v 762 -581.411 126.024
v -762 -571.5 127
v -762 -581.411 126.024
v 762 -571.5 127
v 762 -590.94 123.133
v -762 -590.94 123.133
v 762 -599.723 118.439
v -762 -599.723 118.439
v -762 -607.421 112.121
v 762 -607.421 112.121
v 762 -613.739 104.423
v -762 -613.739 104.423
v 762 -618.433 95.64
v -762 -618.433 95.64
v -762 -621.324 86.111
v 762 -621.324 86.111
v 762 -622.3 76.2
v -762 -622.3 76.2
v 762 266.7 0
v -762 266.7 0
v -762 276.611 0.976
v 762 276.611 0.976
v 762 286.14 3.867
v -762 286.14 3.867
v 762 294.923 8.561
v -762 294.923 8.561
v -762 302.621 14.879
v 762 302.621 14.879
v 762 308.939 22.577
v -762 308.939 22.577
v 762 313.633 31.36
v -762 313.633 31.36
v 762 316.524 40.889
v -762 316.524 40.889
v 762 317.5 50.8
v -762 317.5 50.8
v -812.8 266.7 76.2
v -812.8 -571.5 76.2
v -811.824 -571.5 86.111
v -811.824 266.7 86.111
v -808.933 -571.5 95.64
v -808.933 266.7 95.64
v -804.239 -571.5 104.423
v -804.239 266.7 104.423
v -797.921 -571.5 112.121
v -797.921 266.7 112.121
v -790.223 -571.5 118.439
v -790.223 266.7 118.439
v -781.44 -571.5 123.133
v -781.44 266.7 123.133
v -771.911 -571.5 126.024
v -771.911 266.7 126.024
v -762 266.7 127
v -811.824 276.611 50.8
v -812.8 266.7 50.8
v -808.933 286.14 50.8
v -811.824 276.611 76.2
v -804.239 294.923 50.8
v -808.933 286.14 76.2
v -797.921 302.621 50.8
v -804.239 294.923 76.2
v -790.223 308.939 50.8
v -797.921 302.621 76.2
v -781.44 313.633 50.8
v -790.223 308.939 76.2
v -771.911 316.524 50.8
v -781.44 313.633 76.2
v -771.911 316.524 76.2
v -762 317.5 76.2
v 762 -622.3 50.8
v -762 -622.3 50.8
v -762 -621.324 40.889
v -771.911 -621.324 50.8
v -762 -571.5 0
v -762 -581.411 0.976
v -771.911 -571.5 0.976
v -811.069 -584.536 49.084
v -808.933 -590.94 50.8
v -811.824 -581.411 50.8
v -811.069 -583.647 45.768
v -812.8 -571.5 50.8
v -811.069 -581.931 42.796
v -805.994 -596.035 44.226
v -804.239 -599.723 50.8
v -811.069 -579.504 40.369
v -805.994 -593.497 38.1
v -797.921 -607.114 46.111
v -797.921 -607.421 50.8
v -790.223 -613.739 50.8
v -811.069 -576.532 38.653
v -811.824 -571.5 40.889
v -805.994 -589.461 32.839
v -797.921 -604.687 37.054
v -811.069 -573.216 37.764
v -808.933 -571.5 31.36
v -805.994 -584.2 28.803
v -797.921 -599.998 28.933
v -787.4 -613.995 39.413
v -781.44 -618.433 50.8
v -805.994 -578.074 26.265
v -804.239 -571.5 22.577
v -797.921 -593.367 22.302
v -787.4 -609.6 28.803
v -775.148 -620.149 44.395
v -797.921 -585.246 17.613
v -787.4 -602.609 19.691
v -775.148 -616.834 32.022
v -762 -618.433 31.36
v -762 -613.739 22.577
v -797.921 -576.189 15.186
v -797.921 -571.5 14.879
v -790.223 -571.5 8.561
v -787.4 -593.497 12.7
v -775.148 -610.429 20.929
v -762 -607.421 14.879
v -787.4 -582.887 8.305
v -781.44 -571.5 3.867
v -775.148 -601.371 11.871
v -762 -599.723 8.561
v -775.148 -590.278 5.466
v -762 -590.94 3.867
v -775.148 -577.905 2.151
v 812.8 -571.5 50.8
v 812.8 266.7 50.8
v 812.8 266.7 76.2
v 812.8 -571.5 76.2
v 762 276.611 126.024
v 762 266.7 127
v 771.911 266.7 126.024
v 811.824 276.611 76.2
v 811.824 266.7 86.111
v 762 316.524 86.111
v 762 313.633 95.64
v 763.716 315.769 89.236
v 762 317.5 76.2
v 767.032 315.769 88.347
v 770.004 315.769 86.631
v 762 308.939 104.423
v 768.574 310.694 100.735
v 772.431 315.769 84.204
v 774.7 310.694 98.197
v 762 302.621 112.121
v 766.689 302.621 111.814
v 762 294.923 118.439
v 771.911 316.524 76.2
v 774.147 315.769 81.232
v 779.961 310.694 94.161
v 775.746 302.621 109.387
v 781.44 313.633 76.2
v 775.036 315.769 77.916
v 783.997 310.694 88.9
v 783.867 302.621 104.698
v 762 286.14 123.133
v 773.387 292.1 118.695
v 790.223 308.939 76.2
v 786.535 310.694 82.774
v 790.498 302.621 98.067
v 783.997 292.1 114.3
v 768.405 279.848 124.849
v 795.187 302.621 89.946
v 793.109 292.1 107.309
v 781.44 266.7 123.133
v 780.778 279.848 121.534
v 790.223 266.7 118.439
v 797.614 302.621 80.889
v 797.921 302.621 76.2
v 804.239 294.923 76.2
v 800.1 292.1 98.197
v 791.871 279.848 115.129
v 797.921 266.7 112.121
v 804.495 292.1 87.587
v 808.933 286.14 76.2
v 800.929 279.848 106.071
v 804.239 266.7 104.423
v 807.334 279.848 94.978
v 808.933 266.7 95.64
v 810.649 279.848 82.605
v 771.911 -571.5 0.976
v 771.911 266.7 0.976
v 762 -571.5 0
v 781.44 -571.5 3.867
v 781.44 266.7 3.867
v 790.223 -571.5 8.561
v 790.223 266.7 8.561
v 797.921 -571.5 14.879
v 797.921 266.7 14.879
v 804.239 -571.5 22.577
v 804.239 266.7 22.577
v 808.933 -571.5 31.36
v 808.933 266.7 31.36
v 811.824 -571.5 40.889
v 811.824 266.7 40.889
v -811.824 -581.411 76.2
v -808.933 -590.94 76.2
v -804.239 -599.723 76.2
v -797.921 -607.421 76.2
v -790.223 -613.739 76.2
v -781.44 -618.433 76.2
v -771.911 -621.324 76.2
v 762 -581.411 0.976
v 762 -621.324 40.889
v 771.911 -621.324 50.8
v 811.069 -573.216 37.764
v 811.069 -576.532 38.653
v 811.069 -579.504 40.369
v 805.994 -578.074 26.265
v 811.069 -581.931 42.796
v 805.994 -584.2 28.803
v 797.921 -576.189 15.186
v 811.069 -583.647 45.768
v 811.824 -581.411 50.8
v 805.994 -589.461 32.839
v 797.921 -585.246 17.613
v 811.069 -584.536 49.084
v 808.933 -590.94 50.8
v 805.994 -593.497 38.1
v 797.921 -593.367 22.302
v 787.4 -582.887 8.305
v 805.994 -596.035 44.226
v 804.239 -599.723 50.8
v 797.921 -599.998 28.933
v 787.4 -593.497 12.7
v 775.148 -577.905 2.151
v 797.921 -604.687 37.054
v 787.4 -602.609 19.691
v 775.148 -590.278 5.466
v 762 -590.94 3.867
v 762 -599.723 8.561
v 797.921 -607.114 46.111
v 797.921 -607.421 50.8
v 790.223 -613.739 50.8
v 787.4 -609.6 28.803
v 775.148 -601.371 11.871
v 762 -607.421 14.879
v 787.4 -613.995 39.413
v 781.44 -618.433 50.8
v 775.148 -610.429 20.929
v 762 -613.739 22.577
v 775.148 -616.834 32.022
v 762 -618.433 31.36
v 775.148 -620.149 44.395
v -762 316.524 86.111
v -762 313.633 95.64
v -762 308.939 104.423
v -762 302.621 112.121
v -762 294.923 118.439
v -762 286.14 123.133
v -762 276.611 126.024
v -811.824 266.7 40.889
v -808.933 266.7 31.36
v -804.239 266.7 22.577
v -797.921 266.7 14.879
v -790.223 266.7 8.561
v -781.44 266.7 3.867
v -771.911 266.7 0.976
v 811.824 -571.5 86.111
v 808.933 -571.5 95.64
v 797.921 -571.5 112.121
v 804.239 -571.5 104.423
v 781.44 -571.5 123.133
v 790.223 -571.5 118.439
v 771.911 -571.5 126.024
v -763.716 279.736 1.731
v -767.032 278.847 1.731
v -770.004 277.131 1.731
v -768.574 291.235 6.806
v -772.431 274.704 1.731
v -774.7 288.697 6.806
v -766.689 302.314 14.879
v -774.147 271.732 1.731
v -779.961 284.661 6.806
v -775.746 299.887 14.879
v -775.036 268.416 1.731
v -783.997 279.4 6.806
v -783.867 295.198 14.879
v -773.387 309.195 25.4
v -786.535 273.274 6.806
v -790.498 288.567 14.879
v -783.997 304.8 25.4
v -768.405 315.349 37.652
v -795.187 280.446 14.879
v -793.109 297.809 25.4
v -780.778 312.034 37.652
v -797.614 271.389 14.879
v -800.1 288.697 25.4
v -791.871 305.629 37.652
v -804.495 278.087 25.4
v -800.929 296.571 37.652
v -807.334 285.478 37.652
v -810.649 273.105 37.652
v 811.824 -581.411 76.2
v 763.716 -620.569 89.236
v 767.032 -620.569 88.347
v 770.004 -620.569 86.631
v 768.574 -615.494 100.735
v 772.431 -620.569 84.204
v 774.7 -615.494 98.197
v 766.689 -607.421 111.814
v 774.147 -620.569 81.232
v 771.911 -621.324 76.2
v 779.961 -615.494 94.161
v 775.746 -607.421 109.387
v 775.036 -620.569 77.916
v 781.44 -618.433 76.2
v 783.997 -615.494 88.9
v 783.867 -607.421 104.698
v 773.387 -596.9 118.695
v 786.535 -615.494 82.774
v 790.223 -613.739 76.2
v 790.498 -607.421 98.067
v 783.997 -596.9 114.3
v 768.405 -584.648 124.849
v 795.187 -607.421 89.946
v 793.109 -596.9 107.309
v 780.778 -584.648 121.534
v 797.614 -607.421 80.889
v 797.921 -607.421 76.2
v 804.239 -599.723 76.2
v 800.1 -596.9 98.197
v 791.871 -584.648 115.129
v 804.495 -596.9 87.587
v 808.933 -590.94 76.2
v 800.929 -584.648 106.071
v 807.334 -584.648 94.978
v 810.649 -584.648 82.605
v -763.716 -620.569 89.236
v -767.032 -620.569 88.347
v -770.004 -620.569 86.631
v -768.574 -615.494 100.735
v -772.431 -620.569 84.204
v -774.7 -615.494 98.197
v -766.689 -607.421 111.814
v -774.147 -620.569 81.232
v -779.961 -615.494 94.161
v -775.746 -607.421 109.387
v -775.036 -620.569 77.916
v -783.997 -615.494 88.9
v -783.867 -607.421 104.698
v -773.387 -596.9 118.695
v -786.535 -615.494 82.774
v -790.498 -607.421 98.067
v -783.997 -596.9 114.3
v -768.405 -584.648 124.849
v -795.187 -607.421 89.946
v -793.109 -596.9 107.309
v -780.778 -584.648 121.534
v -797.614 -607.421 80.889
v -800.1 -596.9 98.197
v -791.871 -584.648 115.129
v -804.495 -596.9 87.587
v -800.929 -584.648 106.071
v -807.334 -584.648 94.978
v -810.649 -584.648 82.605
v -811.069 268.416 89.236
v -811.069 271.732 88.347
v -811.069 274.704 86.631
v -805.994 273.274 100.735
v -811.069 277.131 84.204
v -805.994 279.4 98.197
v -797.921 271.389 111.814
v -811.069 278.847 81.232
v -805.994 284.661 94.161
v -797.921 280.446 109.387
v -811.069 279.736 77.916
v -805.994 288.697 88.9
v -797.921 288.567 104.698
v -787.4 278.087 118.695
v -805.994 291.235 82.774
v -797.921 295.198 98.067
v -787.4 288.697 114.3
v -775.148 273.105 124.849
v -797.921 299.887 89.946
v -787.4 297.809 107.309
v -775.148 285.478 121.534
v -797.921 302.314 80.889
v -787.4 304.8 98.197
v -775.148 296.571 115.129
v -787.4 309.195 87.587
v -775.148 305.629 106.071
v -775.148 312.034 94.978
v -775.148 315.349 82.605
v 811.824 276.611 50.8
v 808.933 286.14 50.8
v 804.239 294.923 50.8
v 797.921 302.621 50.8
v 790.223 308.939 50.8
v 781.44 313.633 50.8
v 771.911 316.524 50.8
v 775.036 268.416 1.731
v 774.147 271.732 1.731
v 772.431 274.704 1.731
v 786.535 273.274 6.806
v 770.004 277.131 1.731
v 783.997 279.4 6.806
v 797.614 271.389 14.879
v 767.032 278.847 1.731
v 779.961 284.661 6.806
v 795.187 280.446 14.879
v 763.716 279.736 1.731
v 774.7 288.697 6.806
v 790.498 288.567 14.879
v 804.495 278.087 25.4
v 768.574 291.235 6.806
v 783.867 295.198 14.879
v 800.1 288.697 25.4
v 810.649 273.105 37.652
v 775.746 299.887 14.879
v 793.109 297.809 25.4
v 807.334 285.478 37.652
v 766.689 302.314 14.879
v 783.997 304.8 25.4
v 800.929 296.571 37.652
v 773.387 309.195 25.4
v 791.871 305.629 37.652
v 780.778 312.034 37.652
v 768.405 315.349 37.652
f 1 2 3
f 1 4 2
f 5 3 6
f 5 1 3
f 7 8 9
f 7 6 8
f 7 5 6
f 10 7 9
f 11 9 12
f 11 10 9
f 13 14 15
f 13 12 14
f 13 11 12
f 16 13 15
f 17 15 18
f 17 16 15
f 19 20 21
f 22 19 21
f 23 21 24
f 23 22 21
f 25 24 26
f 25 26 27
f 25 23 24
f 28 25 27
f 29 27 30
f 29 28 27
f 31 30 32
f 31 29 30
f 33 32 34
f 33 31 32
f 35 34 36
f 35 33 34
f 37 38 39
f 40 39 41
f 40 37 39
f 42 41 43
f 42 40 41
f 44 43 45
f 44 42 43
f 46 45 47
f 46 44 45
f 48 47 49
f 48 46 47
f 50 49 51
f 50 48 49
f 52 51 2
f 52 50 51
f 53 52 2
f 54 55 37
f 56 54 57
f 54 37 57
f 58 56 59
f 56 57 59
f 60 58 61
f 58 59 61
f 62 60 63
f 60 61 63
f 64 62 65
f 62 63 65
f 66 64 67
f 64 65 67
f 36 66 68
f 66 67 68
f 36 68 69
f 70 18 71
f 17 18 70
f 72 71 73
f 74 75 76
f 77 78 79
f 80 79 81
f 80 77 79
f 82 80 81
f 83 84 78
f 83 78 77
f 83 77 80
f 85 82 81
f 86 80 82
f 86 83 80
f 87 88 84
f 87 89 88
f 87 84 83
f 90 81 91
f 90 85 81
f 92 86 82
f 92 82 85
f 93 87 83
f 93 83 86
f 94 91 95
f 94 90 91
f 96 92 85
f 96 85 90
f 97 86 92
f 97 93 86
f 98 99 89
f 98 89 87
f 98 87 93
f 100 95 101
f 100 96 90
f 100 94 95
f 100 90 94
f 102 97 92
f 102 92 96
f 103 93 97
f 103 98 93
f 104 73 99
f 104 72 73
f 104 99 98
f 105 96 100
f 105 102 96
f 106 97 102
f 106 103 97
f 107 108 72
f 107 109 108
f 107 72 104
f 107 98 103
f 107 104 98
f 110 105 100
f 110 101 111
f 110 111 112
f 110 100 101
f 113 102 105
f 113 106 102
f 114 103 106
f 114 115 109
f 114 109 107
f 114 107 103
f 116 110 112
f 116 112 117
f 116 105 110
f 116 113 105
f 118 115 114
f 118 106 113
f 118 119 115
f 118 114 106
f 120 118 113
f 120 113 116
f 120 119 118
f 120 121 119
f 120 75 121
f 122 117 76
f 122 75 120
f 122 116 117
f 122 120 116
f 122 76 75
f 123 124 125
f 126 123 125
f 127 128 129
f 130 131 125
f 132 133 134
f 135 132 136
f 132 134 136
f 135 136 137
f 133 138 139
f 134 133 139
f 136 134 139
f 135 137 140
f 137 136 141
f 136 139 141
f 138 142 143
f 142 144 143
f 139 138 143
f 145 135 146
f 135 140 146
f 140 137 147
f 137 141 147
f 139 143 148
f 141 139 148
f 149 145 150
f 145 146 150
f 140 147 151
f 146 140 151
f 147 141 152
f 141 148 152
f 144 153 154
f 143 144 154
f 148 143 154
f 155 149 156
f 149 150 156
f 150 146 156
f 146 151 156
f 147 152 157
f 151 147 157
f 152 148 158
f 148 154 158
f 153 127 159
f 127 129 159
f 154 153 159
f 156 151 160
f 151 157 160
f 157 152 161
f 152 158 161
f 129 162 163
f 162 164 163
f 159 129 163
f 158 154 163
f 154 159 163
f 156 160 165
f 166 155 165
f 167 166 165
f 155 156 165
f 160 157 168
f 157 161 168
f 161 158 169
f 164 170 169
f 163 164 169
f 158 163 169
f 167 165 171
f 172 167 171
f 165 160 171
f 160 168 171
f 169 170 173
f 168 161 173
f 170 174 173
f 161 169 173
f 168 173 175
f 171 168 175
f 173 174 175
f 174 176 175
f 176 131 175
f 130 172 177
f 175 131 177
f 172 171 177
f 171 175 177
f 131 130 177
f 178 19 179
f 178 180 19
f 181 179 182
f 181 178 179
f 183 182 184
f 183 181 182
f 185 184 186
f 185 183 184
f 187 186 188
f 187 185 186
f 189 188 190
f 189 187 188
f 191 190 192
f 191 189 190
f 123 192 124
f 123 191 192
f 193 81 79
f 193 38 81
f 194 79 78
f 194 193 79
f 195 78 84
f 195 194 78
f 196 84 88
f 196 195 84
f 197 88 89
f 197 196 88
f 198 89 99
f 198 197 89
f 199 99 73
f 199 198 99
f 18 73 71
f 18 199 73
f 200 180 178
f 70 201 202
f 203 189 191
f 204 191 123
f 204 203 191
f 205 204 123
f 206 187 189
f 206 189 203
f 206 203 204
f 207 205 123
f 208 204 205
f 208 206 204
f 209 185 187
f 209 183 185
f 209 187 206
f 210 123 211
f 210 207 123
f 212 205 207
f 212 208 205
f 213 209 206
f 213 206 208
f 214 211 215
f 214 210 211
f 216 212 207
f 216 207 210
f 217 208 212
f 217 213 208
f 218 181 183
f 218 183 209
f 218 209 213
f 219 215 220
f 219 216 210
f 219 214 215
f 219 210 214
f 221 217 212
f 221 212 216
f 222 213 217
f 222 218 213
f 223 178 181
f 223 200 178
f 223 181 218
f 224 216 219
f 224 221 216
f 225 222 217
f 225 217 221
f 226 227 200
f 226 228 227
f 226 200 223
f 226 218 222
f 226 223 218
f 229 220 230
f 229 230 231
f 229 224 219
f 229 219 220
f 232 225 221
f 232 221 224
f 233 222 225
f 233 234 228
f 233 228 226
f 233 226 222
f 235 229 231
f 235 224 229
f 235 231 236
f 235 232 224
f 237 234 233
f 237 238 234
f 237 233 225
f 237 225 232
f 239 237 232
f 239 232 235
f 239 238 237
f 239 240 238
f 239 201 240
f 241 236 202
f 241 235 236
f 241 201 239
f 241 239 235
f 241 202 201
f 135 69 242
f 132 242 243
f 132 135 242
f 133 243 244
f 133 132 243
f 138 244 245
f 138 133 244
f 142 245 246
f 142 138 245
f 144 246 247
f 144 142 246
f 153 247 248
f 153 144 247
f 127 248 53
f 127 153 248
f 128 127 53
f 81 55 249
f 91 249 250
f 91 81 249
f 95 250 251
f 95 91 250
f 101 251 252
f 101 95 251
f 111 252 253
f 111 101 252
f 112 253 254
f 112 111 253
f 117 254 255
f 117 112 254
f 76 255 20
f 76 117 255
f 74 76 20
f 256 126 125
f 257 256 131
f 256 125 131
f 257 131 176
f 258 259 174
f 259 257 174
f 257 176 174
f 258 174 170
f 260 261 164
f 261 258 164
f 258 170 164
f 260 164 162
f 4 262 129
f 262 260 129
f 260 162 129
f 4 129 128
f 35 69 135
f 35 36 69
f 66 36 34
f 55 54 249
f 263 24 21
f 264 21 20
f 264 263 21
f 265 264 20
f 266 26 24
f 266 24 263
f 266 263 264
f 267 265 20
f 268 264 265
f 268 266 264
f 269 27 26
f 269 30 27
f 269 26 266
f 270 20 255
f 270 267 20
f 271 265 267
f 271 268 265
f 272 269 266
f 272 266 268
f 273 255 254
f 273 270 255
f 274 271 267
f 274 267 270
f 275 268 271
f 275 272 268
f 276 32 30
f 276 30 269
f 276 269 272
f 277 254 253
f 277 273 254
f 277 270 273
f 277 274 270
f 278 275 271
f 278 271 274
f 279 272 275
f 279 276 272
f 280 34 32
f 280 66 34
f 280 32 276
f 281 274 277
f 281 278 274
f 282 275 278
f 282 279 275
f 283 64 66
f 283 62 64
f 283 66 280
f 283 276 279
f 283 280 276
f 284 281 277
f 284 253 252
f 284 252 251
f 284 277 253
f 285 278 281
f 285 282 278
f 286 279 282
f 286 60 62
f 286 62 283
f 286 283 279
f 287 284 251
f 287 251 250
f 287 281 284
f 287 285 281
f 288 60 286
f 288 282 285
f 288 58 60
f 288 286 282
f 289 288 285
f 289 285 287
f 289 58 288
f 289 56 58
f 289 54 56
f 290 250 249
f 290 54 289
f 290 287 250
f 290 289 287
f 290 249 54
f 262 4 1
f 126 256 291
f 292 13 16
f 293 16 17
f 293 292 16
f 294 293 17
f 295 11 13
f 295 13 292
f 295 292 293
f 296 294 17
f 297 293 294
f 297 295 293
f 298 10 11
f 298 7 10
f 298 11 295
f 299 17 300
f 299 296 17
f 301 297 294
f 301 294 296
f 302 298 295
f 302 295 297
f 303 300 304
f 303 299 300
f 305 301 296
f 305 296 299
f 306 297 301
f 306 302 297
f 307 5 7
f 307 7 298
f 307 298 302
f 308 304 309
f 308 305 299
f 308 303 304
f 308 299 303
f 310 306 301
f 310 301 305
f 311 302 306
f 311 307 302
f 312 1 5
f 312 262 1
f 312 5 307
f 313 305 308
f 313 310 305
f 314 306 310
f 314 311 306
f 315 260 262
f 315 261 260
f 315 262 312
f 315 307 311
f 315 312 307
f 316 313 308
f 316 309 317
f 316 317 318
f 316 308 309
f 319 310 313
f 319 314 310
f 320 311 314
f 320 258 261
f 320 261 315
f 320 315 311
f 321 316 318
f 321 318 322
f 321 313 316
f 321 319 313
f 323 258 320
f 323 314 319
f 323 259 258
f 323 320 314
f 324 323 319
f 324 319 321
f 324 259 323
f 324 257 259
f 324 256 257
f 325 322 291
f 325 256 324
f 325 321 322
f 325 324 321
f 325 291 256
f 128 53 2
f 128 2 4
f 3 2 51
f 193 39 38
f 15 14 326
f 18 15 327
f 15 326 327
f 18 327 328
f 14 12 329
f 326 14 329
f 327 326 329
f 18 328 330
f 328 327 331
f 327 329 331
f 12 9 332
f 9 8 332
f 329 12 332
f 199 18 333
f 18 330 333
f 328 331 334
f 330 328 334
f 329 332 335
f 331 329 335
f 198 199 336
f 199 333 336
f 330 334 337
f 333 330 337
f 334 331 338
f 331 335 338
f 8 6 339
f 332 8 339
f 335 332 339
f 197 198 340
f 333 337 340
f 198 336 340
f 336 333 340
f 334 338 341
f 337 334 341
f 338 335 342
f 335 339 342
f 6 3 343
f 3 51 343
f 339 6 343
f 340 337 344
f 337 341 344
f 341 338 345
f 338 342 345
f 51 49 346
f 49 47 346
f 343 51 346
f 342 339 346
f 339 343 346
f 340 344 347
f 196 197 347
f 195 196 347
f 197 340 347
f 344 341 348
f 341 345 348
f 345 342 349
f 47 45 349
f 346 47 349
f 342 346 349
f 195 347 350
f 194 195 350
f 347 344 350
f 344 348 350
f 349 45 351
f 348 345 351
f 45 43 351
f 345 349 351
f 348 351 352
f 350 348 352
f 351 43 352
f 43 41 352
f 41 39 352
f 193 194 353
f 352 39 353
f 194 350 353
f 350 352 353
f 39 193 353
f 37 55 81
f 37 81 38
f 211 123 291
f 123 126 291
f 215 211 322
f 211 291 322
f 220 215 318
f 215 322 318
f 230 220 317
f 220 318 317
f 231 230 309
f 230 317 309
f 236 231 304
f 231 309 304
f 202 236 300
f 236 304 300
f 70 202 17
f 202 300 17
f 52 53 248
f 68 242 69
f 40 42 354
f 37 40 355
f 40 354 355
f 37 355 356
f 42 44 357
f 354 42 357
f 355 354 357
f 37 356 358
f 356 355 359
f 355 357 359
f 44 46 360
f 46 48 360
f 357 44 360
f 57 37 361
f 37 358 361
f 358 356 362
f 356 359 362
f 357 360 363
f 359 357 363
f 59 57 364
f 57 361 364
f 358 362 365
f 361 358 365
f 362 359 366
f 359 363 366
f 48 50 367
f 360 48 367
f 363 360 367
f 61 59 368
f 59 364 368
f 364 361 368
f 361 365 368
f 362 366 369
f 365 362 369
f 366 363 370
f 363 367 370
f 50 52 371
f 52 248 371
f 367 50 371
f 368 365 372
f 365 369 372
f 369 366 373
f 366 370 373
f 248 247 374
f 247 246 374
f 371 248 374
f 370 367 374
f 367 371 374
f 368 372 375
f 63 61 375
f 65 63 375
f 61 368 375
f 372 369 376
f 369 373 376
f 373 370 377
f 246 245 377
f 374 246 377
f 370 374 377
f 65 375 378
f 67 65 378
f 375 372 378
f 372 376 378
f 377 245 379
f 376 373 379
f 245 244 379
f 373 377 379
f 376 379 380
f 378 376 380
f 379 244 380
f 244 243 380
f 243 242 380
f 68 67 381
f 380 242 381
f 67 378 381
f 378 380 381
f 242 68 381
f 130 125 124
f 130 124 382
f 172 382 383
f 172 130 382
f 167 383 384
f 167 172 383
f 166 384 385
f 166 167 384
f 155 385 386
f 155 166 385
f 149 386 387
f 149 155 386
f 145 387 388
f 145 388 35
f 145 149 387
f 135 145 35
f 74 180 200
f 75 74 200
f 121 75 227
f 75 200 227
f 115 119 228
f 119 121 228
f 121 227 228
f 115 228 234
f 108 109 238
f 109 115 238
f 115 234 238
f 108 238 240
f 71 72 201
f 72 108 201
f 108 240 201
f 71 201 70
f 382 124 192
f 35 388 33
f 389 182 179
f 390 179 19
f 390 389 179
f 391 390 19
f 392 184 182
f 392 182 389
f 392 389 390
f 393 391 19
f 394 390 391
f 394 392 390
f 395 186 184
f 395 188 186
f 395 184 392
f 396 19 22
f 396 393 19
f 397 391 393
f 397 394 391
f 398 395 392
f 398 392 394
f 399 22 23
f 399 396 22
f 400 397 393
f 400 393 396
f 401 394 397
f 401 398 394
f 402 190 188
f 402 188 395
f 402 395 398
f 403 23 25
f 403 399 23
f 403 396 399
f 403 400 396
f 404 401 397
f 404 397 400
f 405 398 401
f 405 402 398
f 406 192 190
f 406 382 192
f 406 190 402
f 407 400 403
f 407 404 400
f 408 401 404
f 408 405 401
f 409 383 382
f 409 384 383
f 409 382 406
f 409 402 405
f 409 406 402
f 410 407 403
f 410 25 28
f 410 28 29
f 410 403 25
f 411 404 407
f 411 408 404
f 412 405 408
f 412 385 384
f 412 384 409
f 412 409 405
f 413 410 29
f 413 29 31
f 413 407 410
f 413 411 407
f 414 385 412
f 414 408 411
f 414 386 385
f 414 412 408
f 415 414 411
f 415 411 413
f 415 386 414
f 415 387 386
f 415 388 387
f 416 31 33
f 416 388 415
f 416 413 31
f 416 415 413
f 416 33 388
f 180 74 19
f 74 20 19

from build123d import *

# Parameters (mm, degrees)
F0_W      = 1625.6
F0_H      = 635
F1_DEPTH  = 127
F1_FACE_W = 1625.6
F1_FACE_H = 127
F2_DEPTH  = 304.8
F3_R      = 50.8


with BuildPart() as f1:
    # F0 (on Top) → F1 (new body)
    with BuildSketch(Plane.XY):
        Rectangle(F0_W, F0_H)
    extrude(amount=F1_DEPTH)

    # F1_face (on face) → F2 (join)
    with BuildSketch(Plane(origin=(0, -317.5, 63.5), x_dir=(1, 0, 0), z_dir=(0, -1, 0))):
        Rectangle(F1_FACE_W, F1_FACE_H)
    extrude(amount=F2_DEPTH)

    # F3
    f3_edges = [f1.edges().sort_by_distance(p)[0] for p in [
        (812.8, -152.4, 127),
        (0, 317.5, 127),
        (-812.8, -152.4, 127),
        (0, -622.3, 127),
        (0, -622.3, 0),
        (812.8, 317.5, 63.5),
        (812.8, -152.4, 0),
        (812.8, -622.3, 63.5),
        (-812.8, 317.5, 63.5),
        (0, 317.5, 0),
        (-812.8, -622.3, 63.5),
        (-812.8, -152.4, 0),
    ]]
    fillet(f3_edges, radius=F3_R)


solid = f1.part
